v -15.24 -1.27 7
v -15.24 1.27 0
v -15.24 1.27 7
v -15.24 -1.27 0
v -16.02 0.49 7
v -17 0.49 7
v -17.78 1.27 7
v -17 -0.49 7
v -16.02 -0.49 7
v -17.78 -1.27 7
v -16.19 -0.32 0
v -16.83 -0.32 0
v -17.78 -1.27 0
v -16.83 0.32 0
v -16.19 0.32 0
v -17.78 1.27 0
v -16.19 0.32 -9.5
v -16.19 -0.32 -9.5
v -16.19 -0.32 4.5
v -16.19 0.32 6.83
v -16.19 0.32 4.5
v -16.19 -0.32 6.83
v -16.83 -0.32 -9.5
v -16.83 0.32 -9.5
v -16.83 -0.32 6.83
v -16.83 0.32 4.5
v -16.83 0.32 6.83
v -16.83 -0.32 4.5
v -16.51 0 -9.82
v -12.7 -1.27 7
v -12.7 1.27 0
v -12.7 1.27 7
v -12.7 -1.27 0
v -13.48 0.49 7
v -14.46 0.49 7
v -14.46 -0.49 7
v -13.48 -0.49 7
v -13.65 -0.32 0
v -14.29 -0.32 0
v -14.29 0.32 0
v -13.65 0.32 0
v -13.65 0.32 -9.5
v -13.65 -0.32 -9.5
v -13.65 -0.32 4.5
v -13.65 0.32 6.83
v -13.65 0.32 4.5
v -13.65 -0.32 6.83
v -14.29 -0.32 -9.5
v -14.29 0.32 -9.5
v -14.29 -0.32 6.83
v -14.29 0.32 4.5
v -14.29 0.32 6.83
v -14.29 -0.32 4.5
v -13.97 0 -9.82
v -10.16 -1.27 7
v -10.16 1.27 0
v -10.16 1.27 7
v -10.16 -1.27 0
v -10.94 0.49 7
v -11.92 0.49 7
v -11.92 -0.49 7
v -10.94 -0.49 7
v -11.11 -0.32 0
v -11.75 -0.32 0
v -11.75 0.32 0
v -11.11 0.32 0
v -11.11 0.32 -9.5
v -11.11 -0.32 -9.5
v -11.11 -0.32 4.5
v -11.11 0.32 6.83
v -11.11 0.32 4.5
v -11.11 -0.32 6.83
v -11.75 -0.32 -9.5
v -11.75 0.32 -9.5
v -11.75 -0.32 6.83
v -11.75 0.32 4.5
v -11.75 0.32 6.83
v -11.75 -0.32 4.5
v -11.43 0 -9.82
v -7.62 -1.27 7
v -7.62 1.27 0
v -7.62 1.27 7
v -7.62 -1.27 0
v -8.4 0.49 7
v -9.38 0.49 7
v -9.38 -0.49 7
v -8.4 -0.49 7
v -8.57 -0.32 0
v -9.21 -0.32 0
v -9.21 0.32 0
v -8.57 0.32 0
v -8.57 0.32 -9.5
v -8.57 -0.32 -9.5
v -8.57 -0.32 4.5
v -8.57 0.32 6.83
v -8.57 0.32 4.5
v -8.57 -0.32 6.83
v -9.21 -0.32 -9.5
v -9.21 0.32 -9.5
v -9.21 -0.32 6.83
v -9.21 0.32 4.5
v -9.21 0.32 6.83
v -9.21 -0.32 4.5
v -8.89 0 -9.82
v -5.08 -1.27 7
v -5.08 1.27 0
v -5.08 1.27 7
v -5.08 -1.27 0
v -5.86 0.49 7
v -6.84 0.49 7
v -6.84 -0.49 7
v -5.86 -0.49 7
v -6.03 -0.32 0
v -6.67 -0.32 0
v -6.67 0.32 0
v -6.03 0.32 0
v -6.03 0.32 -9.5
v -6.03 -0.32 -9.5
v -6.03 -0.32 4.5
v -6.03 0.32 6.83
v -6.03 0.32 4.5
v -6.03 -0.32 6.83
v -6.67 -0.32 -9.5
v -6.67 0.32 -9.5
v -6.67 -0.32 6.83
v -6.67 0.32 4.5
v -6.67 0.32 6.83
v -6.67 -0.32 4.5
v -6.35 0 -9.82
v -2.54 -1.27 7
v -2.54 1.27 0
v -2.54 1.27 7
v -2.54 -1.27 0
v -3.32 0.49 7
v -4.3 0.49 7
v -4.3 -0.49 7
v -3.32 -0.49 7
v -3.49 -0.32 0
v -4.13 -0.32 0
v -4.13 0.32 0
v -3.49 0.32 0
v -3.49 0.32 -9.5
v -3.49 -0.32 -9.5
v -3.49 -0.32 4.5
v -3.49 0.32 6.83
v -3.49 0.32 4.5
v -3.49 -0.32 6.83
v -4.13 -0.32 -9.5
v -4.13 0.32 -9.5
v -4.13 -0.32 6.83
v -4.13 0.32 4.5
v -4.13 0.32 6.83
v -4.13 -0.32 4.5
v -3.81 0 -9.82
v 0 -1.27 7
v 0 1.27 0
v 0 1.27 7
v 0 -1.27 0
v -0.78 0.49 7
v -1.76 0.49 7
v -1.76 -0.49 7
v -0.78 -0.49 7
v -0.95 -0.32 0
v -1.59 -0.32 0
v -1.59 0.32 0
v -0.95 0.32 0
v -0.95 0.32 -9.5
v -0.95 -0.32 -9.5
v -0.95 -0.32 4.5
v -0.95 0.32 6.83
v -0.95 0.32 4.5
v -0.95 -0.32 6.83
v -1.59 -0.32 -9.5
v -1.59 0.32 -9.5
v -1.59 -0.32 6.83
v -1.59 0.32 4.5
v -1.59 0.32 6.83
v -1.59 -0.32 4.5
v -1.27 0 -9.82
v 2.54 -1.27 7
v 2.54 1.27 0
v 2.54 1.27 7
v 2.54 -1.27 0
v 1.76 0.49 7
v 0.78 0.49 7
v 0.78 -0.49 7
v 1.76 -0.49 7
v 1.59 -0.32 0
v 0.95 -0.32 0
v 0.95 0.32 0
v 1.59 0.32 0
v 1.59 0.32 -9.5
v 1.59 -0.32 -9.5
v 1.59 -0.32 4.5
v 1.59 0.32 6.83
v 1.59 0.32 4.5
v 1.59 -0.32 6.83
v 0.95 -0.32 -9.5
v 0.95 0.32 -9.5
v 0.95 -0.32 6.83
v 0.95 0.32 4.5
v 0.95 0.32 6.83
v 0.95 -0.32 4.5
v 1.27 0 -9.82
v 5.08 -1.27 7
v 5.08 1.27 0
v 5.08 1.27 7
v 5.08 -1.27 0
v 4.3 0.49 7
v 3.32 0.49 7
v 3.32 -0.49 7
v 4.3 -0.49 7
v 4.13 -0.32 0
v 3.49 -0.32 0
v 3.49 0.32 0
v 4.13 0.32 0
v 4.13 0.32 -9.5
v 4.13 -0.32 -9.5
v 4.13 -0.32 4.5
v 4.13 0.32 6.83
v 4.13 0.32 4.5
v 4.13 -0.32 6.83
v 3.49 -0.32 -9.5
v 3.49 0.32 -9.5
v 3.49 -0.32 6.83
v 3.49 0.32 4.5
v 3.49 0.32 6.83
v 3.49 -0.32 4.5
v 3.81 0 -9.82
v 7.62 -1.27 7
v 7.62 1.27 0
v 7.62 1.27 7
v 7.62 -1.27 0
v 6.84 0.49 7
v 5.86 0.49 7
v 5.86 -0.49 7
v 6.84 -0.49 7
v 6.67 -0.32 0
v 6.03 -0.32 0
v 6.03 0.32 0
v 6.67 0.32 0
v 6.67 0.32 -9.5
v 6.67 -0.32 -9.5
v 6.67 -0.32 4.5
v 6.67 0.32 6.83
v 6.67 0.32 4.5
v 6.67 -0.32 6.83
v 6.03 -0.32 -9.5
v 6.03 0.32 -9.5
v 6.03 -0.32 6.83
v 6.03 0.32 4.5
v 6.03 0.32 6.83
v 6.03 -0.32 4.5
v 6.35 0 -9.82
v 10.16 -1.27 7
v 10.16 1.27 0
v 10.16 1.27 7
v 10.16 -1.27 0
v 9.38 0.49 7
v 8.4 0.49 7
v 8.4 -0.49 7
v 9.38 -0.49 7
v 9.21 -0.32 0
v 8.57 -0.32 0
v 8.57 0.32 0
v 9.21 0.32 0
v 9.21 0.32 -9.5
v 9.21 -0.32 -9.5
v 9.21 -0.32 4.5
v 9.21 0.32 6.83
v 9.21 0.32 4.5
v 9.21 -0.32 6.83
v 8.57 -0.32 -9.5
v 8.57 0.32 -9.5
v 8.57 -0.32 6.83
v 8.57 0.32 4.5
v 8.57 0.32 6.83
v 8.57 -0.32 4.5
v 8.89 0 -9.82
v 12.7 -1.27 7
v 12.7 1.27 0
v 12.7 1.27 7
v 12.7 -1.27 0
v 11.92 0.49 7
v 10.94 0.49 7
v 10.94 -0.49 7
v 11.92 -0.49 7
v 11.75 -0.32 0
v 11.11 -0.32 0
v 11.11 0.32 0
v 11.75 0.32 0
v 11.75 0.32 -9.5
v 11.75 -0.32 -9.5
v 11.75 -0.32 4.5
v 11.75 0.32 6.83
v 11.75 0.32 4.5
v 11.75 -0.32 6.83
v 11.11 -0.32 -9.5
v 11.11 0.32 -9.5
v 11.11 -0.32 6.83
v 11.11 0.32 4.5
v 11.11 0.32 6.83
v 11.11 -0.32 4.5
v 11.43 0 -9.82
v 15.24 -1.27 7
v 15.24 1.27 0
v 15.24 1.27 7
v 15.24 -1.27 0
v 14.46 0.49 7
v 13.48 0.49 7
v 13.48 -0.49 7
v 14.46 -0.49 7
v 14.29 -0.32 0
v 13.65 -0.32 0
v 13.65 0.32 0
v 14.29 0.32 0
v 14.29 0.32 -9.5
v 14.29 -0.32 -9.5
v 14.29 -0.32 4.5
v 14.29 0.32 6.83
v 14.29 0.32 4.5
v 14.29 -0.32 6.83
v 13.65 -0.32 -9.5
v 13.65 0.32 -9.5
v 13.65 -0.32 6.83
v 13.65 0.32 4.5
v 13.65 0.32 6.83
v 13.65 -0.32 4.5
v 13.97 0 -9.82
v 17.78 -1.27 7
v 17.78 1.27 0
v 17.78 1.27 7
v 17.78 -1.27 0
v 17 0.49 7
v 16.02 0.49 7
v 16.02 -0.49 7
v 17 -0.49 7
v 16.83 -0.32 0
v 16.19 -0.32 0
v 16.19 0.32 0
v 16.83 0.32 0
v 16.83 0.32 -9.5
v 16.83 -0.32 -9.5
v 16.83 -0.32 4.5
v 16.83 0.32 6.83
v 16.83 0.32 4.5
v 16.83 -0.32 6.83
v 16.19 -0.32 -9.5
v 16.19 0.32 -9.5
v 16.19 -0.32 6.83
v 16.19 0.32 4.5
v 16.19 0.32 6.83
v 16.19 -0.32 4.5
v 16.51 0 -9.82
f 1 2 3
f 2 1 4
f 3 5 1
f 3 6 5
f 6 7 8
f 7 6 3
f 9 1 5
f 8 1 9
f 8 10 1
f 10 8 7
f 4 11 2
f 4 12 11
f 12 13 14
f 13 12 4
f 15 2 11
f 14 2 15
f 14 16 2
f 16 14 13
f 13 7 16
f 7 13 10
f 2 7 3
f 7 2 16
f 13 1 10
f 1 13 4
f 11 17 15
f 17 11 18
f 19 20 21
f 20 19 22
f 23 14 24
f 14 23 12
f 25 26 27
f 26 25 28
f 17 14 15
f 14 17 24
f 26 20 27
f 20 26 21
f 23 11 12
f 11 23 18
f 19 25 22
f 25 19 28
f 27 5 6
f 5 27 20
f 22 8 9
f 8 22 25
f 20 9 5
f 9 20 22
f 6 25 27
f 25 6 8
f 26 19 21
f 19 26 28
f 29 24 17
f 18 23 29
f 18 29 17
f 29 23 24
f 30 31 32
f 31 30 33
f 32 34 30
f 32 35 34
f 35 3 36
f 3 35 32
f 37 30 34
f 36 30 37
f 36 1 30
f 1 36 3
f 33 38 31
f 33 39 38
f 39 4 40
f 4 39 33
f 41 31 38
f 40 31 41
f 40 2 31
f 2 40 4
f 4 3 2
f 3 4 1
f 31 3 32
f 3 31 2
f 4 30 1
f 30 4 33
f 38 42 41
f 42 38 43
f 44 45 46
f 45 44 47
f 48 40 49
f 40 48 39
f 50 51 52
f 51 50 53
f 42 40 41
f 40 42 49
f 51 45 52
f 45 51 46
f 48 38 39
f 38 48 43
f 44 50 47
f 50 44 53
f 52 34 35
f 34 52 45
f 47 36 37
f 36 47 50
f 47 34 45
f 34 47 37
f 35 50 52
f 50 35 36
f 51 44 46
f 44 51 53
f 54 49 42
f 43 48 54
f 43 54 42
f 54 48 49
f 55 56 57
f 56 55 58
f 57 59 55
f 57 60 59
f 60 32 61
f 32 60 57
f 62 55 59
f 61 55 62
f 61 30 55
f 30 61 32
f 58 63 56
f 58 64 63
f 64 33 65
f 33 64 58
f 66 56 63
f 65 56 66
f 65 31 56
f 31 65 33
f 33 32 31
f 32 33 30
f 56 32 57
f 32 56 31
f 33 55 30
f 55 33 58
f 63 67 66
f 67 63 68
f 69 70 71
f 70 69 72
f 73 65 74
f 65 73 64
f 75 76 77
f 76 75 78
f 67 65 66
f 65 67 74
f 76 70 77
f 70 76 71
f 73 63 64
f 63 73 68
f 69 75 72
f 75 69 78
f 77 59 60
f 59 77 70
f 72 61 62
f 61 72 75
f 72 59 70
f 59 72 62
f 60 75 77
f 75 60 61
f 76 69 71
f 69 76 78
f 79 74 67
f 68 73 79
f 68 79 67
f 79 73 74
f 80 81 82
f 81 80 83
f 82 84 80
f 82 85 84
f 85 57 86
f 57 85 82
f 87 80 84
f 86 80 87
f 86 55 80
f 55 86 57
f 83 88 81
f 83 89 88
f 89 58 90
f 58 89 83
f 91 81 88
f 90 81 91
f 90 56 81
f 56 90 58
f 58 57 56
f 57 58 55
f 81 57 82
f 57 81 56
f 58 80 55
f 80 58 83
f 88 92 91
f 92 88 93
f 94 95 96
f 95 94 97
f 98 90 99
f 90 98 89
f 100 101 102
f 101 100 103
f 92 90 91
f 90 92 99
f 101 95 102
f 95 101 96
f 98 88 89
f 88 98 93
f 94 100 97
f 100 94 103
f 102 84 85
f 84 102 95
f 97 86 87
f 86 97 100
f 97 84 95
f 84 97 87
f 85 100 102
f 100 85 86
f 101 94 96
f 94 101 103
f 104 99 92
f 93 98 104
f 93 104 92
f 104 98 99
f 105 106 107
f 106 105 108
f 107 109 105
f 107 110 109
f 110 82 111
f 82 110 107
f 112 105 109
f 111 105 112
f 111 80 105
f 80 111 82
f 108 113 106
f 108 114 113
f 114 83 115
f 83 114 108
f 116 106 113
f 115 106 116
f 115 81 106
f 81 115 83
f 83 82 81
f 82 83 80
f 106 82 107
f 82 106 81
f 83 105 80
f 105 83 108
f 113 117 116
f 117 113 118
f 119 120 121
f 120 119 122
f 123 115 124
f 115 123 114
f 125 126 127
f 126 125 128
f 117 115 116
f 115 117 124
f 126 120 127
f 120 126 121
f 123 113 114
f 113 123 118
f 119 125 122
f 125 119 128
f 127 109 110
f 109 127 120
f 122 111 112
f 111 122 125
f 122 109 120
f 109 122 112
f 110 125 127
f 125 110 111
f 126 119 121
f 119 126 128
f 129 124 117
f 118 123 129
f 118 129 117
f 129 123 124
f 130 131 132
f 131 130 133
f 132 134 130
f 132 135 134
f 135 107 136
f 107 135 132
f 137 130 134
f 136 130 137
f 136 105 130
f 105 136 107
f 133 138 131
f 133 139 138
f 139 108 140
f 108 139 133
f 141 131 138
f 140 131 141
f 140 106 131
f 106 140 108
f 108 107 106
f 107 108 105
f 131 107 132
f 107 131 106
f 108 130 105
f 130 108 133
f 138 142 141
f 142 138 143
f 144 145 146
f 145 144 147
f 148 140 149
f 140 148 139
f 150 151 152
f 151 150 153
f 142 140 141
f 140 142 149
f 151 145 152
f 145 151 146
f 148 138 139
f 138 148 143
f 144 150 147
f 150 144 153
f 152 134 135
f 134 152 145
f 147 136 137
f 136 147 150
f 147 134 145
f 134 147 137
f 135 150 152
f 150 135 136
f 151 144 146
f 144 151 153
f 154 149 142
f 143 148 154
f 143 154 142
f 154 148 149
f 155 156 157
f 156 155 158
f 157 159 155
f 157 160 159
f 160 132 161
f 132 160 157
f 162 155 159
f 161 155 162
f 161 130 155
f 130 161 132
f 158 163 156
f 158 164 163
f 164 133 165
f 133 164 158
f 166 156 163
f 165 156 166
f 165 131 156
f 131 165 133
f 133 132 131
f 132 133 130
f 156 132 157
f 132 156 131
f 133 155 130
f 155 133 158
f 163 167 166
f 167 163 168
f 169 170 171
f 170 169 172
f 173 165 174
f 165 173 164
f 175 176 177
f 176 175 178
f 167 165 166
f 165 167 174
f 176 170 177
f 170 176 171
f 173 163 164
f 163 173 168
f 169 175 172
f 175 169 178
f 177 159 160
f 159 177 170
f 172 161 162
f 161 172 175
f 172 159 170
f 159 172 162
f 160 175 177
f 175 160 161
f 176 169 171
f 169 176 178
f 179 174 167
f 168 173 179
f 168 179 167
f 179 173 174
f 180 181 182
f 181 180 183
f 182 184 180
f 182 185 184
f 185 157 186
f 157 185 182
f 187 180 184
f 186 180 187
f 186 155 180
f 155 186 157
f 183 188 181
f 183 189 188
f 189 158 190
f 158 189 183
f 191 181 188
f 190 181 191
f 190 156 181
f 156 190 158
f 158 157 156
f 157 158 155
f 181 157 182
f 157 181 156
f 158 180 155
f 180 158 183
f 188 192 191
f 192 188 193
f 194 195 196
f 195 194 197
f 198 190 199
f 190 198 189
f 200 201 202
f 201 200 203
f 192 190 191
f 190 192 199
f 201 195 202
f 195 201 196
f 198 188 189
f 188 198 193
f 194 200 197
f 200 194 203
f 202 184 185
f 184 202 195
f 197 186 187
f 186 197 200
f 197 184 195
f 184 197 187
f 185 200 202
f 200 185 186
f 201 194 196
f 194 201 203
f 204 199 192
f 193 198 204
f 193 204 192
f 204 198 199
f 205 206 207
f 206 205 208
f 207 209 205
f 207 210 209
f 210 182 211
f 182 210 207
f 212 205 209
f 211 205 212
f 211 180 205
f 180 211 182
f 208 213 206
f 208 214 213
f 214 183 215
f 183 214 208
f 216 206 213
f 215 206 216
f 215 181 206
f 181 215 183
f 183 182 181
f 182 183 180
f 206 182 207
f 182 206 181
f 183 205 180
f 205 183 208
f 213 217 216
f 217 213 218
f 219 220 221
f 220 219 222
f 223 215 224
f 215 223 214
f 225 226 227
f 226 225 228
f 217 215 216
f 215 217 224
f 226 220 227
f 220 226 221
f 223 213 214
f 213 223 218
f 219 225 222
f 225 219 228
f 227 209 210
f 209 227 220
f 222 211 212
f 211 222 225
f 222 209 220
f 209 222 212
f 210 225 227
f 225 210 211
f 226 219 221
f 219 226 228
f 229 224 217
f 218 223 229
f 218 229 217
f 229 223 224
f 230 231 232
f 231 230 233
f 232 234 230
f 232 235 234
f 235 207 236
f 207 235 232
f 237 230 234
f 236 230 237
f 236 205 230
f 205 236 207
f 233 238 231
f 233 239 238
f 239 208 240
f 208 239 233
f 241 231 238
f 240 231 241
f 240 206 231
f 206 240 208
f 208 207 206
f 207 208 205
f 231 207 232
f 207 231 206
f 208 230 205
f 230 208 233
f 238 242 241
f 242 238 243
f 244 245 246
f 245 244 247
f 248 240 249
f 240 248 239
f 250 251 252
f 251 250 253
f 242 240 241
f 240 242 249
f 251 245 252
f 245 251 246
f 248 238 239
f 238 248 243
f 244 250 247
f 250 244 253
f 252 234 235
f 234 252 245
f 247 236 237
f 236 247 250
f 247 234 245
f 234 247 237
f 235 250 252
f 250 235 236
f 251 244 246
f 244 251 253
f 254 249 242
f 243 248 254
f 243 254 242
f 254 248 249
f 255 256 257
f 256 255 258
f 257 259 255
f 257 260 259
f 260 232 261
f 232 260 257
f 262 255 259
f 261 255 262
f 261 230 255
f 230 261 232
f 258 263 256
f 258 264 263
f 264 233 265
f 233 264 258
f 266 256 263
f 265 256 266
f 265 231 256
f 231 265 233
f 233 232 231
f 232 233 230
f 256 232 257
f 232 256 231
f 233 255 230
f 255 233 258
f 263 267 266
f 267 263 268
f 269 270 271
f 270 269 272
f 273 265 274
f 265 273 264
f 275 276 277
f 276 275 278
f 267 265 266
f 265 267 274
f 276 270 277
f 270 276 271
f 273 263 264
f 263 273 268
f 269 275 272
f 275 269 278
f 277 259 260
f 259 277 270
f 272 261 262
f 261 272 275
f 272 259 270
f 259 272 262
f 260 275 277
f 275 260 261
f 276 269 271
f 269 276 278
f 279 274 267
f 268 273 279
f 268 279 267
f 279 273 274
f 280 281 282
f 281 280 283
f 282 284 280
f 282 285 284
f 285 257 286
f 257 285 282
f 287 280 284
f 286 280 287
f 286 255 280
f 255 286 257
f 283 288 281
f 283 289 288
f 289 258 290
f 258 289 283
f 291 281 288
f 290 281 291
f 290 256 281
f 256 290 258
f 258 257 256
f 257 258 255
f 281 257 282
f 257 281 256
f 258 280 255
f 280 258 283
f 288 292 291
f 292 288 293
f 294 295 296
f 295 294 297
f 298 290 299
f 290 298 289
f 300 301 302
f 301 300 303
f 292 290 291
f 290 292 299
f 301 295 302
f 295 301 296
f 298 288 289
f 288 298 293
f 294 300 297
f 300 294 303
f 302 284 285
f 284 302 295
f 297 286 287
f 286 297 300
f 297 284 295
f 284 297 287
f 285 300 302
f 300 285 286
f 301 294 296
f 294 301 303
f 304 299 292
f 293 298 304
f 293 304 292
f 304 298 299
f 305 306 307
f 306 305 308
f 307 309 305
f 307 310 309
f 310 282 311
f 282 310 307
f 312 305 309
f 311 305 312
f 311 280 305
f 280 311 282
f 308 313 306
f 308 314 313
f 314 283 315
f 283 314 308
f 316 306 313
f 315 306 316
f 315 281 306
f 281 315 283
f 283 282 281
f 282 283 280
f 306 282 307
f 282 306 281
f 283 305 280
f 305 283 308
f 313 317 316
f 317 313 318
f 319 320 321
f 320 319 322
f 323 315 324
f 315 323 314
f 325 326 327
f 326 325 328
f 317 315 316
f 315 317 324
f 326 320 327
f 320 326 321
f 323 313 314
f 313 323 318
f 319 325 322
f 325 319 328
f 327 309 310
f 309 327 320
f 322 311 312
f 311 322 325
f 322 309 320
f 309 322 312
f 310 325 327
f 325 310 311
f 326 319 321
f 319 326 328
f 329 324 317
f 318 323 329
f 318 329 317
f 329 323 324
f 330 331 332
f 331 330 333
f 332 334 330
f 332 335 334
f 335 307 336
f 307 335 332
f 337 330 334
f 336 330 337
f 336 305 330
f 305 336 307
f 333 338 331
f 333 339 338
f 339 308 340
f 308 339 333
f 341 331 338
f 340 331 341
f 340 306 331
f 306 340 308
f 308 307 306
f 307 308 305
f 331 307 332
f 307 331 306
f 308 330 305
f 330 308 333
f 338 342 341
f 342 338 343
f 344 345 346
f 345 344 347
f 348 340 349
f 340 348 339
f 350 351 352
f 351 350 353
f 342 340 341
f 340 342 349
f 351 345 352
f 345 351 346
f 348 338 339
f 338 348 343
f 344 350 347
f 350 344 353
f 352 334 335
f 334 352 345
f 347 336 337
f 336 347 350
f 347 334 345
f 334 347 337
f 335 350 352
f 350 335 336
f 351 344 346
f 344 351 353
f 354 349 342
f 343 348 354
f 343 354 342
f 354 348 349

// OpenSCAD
// file: ../utils/pin_socket.scad
module pin_socket(cols=1, rows=1, pin_height=5, spacing=2.54) {
  socket_height = 7;
  pin_width = 0.64;

  translate([
      -(rows * spacing / 2) + spacing / 2,
      -(cols * spacing / 2) + spacing / 2,
      0
  ]) {
    for (col = [0:cols - 1]) {
      for (row = [0:rows - 1]) {
        translate([spacing * row, spacing * col, 0]) {
          translate([0, 0, socket_height / 2]) {
            difference() {
              color("dimgray")
                cube([spacing, spacing, socket_height], center=true);

              translate([0, 0, 1]) {
                cube([pin_width, pin_width, socket_height], center=true);
              }

              translate([0, 0, 0.01 + socket_height / 2]) {
                rotate([180, 0, 0]) pin_tip("dimgray");
              }
            }

            translate([0, 0, -(pin_height / 2) + 1]) {
              color("gold")
                cube([pin_width, pin_width, pin_height], center=true);

              translate([0, 0, -(pin_height / 2)]) {
                scale(pin_width) rotate([180, 0, 0]) pin_tip();
              }
            }
          }
        }
      }
    }
  }

  module pin_tip(c="gold") {
    translate([-0.5, -0.5, 0]) {
      color(c)
        polyhedron(
          [
            [0,  0,  0],
            [1,  0,  0],
            [0,  1,  0],
            [1,  1,  0],
            [0.5, 0.5, 0.5]
          ],
          [
            [4, 1, 0],
            [4, 3, 1],
            [4, 2, 3],
            [4, 0, 2],
            [0, 1, 2],
            [2, 1, 3]
          ]
        );
    }
  }
}
// main file
include <../utils/pin_socket.scad>

pin_socket(rows=14, pin_height=14);
